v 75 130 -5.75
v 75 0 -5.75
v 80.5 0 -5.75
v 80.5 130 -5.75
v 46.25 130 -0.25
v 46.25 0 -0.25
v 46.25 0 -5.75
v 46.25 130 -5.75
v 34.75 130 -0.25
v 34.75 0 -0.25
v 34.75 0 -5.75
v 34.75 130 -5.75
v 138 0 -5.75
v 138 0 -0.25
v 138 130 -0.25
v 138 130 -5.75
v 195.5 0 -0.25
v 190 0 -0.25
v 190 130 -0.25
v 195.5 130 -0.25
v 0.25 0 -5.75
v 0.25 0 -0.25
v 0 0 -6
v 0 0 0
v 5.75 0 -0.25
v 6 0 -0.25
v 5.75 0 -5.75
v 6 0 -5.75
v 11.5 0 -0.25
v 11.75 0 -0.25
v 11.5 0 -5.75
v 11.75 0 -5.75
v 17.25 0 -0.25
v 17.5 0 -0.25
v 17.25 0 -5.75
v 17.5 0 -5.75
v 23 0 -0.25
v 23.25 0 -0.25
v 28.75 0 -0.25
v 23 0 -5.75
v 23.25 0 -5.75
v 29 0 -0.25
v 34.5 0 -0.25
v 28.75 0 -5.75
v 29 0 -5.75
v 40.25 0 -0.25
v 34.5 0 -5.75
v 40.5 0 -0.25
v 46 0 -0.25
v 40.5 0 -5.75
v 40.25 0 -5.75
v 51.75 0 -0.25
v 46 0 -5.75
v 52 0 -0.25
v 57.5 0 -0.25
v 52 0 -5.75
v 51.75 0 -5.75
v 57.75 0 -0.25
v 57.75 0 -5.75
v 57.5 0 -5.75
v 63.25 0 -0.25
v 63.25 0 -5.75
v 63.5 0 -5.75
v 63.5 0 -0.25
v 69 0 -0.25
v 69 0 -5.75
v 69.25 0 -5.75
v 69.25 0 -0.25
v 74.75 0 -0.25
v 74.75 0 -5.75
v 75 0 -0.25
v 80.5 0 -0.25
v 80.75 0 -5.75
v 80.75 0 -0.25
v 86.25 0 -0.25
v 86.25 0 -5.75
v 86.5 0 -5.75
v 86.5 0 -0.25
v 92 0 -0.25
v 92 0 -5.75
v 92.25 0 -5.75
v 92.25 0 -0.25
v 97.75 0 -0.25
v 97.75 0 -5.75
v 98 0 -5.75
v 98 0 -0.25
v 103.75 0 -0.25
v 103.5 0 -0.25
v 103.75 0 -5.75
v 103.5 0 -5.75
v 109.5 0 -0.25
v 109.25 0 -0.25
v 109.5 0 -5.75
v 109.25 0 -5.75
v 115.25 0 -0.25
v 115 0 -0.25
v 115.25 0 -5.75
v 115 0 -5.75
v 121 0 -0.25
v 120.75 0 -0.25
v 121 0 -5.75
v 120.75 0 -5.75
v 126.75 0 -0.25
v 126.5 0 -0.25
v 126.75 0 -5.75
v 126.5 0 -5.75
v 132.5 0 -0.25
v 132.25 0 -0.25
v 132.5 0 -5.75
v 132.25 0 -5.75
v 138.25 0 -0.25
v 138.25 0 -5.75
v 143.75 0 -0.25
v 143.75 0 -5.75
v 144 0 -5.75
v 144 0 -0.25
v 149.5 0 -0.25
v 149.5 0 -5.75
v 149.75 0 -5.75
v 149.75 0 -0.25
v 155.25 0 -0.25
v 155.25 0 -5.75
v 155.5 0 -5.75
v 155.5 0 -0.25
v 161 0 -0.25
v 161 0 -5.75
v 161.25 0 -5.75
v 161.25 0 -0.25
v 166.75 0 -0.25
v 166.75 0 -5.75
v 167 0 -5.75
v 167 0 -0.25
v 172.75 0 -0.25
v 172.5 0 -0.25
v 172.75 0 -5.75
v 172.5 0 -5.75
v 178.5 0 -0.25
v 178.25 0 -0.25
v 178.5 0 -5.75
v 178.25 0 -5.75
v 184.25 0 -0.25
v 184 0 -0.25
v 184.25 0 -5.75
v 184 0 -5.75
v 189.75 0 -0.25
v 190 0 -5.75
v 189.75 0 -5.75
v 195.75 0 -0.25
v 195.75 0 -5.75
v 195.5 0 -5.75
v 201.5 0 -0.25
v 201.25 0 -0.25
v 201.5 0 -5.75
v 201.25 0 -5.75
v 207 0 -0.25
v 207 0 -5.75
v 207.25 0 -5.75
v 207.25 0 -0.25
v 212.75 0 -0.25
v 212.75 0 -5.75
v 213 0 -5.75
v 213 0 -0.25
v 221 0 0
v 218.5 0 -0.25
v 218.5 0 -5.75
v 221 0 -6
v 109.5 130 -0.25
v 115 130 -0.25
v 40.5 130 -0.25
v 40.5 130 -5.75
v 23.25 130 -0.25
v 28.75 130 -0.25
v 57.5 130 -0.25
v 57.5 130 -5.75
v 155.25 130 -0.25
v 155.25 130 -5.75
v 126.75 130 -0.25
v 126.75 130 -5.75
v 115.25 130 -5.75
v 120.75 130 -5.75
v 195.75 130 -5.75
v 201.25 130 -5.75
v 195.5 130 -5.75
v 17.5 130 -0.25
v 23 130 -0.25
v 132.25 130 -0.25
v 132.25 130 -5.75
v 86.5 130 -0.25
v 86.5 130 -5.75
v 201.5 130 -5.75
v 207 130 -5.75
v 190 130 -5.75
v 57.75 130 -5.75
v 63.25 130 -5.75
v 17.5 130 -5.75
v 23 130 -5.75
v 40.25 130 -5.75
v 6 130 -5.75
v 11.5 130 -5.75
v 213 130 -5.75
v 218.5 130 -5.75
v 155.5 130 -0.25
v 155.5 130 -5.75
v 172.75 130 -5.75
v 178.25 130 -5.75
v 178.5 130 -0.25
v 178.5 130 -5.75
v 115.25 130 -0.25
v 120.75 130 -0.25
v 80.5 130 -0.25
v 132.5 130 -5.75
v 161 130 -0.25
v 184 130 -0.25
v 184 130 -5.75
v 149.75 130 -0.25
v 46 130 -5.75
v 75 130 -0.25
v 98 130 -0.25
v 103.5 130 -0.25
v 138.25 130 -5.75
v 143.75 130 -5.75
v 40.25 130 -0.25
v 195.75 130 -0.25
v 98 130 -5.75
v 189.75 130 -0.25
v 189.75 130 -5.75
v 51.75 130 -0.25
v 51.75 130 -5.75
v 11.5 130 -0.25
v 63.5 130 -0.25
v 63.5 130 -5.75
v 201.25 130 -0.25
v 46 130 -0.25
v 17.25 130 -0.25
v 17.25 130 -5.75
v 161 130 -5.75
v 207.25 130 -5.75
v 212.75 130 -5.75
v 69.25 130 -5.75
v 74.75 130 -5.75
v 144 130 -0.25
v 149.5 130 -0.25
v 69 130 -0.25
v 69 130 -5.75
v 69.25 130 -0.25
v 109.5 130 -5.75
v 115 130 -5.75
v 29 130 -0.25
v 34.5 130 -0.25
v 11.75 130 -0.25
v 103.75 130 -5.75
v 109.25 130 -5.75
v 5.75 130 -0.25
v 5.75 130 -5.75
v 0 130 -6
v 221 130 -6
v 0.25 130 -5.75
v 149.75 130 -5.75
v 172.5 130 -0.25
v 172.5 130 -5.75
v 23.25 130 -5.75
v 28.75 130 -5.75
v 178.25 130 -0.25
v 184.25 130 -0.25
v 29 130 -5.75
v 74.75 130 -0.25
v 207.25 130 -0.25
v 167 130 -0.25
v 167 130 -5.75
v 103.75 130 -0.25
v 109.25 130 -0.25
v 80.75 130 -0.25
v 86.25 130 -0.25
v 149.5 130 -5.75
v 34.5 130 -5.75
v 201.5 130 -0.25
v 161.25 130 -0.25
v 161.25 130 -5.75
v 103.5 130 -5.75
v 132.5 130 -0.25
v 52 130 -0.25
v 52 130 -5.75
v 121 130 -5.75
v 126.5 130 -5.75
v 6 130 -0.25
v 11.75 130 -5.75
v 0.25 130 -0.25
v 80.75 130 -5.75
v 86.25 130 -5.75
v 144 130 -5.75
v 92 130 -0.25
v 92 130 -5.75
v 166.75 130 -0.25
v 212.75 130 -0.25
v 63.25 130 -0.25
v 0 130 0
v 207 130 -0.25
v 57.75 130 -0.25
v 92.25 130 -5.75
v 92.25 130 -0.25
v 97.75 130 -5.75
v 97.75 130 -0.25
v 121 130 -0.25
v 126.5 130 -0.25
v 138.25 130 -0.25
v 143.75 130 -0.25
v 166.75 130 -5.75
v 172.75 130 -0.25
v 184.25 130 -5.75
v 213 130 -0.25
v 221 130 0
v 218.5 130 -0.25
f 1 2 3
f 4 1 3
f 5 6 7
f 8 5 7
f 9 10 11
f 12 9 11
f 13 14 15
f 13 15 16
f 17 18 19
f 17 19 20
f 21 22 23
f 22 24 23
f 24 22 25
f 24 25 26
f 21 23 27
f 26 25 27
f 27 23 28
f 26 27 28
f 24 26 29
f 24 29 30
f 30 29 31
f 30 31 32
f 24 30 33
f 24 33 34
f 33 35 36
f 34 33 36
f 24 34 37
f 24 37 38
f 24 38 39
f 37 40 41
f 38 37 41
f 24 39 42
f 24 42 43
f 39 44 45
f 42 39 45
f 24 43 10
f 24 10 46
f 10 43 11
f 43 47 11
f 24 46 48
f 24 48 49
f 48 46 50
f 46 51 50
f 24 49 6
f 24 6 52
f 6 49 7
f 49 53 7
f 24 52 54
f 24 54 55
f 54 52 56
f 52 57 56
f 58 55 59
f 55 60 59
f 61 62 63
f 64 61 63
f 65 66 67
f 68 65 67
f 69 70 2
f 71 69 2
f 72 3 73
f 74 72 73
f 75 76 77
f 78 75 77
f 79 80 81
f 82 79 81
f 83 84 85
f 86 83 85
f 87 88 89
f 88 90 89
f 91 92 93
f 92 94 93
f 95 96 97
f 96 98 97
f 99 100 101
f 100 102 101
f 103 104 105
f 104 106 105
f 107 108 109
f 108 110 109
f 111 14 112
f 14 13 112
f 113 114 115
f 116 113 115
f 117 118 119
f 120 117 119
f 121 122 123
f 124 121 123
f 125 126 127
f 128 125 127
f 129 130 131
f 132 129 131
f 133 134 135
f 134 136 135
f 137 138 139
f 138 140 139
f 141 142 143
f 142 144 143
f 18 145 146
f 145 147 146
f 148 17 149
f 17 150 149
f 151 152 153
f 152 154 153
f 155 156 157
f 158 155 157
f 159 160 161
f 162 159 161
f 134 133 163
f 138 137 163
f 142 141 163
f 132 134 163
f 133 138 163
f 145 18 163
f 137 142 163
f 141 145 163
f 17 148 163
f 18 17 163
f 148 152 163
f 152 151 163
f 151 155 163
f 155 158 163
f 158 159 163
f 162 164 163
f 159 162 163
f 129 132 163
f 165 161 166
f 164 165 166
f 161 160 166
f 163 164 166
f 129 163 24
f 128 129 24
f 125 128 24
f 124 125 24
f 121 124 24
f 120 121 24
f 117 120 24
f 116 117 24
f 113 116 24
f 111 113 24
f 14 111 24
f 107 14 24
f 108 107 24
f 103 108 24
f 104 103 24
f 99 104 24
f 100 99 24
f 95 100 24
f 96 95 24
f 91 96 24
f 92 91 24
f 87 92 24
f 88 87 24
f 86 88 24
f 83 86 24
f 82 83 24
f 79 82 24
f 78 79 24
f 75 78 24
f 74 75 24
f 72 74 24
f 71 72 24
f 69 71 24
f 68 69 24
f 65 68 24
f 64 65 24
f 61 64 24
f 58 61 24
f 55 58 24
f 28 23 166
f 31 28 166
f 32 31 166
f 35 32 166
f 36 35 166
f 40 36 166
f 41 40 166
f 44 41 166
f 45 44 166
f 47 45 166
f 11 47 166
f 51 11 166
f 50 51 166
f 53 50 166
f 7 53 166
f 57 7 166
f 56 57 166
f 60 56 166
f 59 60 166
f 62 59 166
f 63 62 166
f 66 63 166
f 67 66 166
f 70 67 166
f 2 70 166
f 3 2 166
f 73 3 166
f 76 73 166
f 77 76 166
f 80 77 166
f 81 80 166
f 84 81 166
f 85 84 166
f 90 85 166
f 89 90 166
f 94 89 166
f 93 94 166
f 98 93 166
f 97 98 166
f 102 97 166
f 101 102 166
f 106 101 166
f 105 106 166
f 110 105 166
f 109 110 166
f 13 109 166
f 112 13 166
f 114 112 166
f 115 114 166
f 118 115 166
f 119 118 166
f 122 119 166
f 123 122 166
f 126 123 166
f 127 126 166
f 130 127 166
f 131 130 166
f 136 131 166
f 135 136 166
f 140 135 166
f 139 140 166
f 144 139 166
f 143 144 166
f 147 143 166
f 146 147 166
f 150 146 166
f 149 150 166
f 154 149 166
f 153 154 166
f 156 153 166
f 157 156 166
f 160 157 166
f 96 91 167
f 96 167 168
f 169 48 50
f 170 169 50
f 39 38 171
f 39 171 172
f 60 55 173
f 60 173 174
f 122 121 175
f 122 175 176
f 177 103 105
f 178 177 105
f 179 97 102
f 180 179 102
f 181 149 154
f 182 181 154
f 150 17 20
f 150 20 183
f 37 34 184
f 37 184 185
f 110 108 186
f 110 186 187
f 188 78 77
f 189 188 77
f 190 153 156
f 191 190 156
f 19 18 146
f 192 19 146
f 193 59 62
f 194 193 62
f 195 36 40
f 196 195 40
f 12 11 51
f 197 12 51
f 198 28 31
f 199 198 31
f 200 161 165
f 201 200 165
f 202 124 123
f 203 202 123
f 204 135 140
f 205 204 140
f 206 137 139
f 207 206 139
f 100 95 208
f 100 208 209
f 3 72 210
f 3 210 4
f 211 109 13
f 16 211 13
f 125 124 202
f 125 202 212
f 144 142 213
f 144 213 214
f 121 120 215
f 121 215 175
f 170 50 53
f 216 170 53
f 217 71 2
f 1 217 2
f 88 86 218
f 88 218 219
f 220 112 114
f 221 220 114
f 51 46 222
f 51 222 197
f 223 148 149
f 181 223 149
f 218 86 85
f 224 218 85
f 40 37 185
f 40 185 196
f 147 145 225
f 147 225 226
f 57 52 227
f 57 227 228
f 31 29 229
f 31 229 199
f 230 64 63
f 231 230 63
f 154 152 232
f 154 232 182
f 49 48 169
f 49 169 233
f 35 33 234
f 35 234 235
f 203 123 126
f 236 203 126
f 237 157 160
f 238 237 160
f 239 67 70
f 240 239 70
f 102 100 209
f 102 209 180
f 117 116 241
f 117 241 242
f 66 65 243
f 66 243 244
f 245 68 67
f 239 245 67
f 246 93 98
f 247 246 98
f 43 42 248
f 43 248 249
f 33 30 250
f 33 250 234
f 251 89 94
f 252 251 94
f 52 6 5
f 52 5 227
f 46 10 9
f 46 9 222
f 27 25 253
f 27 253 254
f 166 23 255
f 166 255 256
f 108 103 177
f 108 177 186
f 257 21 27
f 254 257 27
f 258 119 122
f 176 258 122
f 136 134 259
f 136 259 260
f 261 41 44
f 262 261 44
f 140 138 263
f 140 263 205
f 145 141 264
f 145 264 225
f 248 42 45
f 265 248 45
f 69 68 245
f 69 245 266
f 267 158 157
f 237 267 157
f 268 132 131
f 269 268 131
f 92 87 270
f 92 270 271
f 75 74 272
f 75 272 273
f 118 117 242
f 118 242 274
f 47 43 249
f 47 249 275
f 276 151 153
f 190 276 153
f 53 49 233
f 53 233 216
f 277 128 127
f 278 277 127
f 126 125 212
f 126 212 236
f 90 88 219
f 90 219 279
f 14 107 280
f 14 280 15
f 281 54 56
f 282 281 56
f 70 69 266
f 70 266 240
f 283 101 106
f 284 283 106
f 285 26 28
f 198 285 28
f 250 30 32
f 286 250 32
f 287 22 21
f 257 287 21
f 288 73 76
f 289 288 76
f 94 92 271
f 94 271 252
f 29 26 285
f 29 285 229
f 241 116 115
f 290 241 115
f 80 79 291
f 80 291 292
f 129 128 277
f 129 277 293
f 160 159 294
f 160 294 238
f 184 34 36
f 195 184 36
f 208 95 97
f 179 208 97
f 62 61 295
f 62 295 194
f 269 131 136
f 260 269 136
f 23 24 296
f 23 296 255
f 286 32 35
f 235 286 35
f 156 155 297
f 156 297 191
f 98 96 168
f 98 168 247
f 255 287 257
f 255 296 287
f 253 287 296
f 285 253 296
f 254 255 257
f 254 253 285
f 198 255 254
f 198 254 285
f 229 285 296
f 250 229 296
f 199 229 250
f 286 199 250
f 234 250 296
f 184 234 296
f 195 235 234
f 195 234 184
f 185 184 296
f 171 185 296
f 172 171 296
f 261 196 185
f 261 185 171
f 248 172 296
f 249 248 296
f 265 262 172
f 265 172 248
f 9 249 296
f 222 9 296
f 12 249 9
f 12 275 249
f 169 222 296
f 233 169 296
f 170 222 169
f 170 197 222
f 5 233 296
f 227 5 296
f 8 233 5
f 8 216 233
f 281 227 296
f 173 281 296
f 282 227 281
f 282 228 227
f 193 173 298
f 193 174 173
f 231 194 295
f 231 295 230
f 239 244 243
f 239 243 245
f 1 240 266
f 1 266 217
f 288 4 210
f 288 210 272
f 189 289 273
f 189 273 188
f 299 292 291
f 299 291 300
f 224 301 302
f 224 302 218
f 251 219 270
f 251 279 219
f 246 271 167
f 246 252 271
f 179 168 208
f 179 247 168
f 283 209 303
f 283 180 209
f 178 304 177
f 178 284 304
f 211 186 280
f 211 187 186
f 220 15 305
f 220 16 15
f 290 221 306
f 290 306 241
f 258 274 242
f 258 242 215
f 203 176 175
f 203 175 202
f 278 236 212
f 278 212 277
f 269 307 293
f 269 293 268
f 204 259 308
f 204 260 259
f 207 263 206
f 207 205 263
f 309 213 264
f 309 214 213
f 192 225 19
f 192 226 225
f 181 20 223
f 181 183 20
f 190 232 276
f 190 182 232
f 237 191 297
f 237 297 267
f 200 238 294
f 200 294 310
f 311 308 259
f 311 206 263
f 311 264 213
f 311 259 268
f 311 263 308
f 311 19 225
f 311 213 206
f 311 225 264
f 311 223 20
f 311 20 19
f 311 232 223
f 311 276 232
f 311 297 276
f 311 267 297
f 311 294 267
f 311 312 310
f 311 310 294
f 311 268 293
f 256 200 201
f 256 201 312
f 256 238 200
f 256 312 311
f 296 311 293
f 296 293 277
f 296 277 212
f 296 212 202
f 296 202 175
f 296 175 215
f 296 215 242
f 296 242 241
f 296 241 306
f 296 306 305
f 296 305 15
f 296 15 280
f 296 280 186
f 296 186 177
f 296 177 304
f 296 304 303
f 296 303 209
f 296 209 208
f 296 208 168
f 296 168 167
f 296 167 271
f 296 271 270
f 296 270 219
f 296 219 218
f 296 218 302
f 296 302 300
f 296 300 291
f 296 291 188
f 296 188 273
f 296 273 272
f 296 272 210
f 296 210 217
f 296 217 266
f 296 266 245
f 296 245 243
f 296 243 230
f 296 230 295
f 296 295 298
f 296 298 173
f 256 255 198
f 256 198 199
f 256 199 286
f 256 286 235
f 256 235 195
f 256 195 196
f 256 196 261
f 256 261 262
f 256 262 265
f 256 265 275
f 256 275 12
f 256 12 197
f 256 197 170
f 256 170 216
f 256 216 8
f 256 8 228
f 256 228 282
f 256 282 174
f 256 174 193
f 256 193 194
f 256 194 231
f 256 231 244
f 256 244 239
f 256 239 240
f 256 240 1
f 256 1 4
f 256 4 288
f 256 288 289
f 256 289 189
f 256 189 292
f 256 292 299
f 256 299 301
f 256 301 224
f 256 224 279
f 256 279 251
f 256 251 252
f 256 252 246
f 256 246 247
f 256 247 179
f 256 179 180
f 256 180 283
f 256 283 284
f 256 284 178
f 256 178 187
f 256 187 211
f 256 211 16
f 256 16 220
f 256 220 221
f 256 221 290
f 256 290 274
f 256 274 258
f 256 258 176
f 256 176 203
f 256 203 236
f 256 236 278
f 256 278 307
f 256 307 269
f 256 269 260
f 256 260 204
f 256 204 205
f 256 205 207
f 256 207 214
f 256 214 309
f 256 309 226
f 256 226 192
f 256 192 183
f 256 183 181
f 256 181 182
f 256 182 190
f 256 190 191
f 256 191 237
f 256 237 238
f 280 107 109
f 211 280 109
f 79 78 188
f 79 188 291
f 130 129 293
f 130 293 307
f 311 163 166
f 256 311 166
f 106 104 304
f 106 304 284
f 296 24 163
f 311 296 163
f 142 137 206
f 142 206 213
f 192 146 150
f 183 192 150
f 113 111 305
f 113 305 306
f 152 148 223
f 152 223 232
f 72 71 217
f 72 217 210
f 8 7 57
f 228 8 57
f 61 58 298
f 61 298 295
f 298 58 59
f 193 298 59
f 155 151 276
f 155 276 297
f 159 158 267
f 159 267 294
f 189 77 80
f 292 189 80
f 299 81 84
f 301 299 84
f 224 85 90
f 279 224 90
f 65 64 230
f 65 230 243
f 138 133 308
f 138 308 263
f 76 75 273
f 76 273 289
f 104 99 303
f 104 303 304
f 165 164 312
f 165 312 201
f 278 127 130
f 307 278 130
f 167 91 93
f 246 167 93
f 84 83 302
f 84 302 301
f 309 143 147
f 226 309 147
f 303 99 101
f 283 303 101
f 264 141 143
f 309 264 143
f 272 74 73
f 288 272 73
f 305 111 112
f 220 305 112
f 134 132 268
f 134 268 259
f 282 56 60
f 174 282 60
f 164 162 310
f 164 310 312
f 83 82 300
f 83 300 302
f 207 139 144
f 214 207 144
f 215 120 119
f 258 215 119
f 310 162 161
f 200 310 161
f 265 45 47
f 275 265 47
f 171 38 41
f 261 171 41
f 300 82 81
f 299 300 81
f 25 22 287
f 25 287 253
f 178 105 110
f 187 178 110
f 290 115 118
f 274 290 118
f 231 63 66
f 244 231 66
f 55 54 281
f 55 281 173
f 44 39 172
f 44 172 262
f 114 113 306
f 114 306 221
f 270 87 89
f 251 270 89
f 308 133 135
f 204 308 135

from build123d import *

# Parameters (mm, degrees)
SKETCH1_W           = 221
SKETCH1_H           = 6
SKETCH1_W_2         = 5.5
SKETCH1_H_2         = 5.5
BOSS_EXTRUDE1_DEPTH = 130


with BuildPart() as part:
    # Sketch1 → Boss-Extrude1 (new body)
    with BuildSketch(Plane(origin=(0, 0, 0), x_dir=(1, 0, 0), z_dir=(0, 1, 0))):
        with Locations((110.5, 3)):
            Rectangle(SKETCH1_W, SKETCH1_H)
        with Locations((8.75, 3)):
            Rectangle(SKETCH1_W_2, SKETCH1_H_2, mode=Mode.SUBTRACT)
        with Locations((3, 3)):
            Rectangle(SKETCH1_W_2, SKETCH1_H_2, mode=Mode.SUBTRACT)
        with Locations((14.5, 3)):
            Rectangle(SKETCH1_W_2, SKETCH1_H_2, mode=Mode.SUBTRACT)
        with Locations((20.25, 3)):
            Rectangle(SKETCH1_W_2, SKETCH1_H_2, mode=Mode.SUBTRACT)
        with Locations((26, 3)):
            Rectangle(SKETCH1_W_2, SKETCH1_H_2, mode=Mode.SUBTRACT)
        with Locations((31.75, 3)):
            Rectangle(SKETCH1_W_2, SKETCH1_H_2, mode=Mode.SUBTRACT)
        with Locations((37.5, 3)):
            Rectangle(SKETCH1_W_2, SKETCH1_H_2, mode=Mode.SUBTRACT)
        with Locations((43.25, 3)):
            Rectangle(SKETCH1_W_2, SKETCH1_H_2, mode=Mode.SUBTRACT)
        with Locations((49, 3)):
            Rectangle(SKETCH1_W_2, SKETCH1_H_2, mode=Mode.SUBTRACT)
        with Locations((54.75, 3)):
            Rectangle(SKETCH1_W_2, SKETCH1_H_2, mode=Mode.SUBTRACT)
        with Locations((60.5, 3)):
            Rectangle(SKETCH1_W_2, SKETCH1_H_2, mode=Mode.SUBTRACT)
        with Locations((66.25, 3)):
            Rectangle(SKETCH1_W_2, SKETCH1_H_2, mode=Mode.SUBTRACT)
        with Locations((72, 3)):
            Rectangle(SKETCH1_W_2, SKETCH1_H_2, mode=Mode.SUBTRACT)
        with Locations((77.75, 3)):
            Rectangle(SKETCH1_W_2, SKETCH1_H_2, mode=Mode.SUBTRACT)
        with Locations((83.5, 3)):
            Rectangle(SKETCH1_W_2, SKETCH1_H_2, mode=Mode.SUBTRACT)
        with Locations((89.25, 3)):
            Rectangle(SKETCH1_W_2, SKETCH1_H_2, mode=Mode.SUBTRACT)
        with Locations((95, 3)):
            Rectangle(SKETCH1_W_2, SKETCH1_H_2, mode=Mode.SUBTRACT)
        with Locations((100.75, 3)):
            Rectangle(SKETCH1_W_2, SKETCH1_H_2, mode=Mode.SUBTRACT)
        with Locations((106.5, 3)):
            Rectangle(SKETCH1_W_2, SKETCH1_H_2, mode=Mode.SUBTRACT)
        with Locations((112.25, 3)):
            Rectangle(SKETCH1_W_2, SKETCH1_H_2, mode=Mode.SUBTRACT)
        with Locations((118, 3)):
            Rectangle(SKETCH1_W_2, SKETCH1_H_2, mode=Mode.SUBTRACT)
        with Locations((123.75, 3)):
            Rectangle(SKETCH1_W_2, SKETCH1_H_2, mode=Mode.SUBTRACT)
        with Locations((129.5, 3)):
            Rectangle(SKETCH1_W_2, SKETCH1_H_2, mode=Mode.SUBTRACT)
        with Locations((135.25, 3)):
            Rectangle(SKETCH1_W_2, SKETCH1_H_2, mode=Mode.SUBTRACT)
        with Locations((141, 3)):
            Rectangle(SKETCH1_W_2, SKETCH1_H_2, mode=Mode.SUBTRACT)
        with Locations((146.75, 3)):
            Rectangle(SKETCH1_W_2, SKETCH1_H_2, mode=Mode.SUBTRACT)
        with Locations((152.5, 3)):
            Rectangle(SKETCH1_W_2, SKETCH1_H_2, mode=Mode.SUBTRACT)
        with Locations((158.25, 3)):
            Rectangle(SKETCH1_W_2, SKETCH1_H_2, mode=Mode.SUBTRACT)
        with Locations((164, 3)):
            Rectangle(SKETCH1_W_2, SKETCH1_H_2, mode=Mode.SUBTRACT)
        with Locations((169.75, 3)):
            Rectangle(SKETCH1_W_2, SKETCH1_H_2, mode=Mode.SUBTRACT)
        with Locations((175.5, 3)):
            Rectangle(SKETCH1_W_2, SKETCH1_H_2, mode=Mode.SUBTRACT)
        with Locations((181.25, 3)):
            Rectangle(SKETCH1_W_2, SKETCH1_H_2, mode=Mode.SUBTRACT)
        with Locations((187, 3)):
            Rectangle(SKETCH1_W_2, SKETCH1_H_2, mode=Mode.SUBTRACT)
        with Locations((192.75, 3)):
            Rectangle(SKETCH1_W_2, SKETCH1_H_2, mode=Mode.SUBTRACT)
        with Locations((198.5, 3)):
            Rectangle(SKETCH1_W_2, SKETCH1_H_2, mode=Mode.SUBTRACT)
        with Locations((204.25, 3)):
            Rectangle(SKETCH1_W_2, SKETCH1_H_2, mode=Mode.SUBTRACT)
        with Locations((210, 3)):
            Rectangle(SKETCH1_W_2, SKETCH1_H_2, mode=Mode.SUBTRACT)
        with Locations((215.75, 3)):
            Rectangle(SKETCH1_W_2, SKETCH1_H_2, mode=Mode.SUBTRACT)
    extrude(amount=BOSS_EXTRUDE1_DEPTH)


solid = part.part
